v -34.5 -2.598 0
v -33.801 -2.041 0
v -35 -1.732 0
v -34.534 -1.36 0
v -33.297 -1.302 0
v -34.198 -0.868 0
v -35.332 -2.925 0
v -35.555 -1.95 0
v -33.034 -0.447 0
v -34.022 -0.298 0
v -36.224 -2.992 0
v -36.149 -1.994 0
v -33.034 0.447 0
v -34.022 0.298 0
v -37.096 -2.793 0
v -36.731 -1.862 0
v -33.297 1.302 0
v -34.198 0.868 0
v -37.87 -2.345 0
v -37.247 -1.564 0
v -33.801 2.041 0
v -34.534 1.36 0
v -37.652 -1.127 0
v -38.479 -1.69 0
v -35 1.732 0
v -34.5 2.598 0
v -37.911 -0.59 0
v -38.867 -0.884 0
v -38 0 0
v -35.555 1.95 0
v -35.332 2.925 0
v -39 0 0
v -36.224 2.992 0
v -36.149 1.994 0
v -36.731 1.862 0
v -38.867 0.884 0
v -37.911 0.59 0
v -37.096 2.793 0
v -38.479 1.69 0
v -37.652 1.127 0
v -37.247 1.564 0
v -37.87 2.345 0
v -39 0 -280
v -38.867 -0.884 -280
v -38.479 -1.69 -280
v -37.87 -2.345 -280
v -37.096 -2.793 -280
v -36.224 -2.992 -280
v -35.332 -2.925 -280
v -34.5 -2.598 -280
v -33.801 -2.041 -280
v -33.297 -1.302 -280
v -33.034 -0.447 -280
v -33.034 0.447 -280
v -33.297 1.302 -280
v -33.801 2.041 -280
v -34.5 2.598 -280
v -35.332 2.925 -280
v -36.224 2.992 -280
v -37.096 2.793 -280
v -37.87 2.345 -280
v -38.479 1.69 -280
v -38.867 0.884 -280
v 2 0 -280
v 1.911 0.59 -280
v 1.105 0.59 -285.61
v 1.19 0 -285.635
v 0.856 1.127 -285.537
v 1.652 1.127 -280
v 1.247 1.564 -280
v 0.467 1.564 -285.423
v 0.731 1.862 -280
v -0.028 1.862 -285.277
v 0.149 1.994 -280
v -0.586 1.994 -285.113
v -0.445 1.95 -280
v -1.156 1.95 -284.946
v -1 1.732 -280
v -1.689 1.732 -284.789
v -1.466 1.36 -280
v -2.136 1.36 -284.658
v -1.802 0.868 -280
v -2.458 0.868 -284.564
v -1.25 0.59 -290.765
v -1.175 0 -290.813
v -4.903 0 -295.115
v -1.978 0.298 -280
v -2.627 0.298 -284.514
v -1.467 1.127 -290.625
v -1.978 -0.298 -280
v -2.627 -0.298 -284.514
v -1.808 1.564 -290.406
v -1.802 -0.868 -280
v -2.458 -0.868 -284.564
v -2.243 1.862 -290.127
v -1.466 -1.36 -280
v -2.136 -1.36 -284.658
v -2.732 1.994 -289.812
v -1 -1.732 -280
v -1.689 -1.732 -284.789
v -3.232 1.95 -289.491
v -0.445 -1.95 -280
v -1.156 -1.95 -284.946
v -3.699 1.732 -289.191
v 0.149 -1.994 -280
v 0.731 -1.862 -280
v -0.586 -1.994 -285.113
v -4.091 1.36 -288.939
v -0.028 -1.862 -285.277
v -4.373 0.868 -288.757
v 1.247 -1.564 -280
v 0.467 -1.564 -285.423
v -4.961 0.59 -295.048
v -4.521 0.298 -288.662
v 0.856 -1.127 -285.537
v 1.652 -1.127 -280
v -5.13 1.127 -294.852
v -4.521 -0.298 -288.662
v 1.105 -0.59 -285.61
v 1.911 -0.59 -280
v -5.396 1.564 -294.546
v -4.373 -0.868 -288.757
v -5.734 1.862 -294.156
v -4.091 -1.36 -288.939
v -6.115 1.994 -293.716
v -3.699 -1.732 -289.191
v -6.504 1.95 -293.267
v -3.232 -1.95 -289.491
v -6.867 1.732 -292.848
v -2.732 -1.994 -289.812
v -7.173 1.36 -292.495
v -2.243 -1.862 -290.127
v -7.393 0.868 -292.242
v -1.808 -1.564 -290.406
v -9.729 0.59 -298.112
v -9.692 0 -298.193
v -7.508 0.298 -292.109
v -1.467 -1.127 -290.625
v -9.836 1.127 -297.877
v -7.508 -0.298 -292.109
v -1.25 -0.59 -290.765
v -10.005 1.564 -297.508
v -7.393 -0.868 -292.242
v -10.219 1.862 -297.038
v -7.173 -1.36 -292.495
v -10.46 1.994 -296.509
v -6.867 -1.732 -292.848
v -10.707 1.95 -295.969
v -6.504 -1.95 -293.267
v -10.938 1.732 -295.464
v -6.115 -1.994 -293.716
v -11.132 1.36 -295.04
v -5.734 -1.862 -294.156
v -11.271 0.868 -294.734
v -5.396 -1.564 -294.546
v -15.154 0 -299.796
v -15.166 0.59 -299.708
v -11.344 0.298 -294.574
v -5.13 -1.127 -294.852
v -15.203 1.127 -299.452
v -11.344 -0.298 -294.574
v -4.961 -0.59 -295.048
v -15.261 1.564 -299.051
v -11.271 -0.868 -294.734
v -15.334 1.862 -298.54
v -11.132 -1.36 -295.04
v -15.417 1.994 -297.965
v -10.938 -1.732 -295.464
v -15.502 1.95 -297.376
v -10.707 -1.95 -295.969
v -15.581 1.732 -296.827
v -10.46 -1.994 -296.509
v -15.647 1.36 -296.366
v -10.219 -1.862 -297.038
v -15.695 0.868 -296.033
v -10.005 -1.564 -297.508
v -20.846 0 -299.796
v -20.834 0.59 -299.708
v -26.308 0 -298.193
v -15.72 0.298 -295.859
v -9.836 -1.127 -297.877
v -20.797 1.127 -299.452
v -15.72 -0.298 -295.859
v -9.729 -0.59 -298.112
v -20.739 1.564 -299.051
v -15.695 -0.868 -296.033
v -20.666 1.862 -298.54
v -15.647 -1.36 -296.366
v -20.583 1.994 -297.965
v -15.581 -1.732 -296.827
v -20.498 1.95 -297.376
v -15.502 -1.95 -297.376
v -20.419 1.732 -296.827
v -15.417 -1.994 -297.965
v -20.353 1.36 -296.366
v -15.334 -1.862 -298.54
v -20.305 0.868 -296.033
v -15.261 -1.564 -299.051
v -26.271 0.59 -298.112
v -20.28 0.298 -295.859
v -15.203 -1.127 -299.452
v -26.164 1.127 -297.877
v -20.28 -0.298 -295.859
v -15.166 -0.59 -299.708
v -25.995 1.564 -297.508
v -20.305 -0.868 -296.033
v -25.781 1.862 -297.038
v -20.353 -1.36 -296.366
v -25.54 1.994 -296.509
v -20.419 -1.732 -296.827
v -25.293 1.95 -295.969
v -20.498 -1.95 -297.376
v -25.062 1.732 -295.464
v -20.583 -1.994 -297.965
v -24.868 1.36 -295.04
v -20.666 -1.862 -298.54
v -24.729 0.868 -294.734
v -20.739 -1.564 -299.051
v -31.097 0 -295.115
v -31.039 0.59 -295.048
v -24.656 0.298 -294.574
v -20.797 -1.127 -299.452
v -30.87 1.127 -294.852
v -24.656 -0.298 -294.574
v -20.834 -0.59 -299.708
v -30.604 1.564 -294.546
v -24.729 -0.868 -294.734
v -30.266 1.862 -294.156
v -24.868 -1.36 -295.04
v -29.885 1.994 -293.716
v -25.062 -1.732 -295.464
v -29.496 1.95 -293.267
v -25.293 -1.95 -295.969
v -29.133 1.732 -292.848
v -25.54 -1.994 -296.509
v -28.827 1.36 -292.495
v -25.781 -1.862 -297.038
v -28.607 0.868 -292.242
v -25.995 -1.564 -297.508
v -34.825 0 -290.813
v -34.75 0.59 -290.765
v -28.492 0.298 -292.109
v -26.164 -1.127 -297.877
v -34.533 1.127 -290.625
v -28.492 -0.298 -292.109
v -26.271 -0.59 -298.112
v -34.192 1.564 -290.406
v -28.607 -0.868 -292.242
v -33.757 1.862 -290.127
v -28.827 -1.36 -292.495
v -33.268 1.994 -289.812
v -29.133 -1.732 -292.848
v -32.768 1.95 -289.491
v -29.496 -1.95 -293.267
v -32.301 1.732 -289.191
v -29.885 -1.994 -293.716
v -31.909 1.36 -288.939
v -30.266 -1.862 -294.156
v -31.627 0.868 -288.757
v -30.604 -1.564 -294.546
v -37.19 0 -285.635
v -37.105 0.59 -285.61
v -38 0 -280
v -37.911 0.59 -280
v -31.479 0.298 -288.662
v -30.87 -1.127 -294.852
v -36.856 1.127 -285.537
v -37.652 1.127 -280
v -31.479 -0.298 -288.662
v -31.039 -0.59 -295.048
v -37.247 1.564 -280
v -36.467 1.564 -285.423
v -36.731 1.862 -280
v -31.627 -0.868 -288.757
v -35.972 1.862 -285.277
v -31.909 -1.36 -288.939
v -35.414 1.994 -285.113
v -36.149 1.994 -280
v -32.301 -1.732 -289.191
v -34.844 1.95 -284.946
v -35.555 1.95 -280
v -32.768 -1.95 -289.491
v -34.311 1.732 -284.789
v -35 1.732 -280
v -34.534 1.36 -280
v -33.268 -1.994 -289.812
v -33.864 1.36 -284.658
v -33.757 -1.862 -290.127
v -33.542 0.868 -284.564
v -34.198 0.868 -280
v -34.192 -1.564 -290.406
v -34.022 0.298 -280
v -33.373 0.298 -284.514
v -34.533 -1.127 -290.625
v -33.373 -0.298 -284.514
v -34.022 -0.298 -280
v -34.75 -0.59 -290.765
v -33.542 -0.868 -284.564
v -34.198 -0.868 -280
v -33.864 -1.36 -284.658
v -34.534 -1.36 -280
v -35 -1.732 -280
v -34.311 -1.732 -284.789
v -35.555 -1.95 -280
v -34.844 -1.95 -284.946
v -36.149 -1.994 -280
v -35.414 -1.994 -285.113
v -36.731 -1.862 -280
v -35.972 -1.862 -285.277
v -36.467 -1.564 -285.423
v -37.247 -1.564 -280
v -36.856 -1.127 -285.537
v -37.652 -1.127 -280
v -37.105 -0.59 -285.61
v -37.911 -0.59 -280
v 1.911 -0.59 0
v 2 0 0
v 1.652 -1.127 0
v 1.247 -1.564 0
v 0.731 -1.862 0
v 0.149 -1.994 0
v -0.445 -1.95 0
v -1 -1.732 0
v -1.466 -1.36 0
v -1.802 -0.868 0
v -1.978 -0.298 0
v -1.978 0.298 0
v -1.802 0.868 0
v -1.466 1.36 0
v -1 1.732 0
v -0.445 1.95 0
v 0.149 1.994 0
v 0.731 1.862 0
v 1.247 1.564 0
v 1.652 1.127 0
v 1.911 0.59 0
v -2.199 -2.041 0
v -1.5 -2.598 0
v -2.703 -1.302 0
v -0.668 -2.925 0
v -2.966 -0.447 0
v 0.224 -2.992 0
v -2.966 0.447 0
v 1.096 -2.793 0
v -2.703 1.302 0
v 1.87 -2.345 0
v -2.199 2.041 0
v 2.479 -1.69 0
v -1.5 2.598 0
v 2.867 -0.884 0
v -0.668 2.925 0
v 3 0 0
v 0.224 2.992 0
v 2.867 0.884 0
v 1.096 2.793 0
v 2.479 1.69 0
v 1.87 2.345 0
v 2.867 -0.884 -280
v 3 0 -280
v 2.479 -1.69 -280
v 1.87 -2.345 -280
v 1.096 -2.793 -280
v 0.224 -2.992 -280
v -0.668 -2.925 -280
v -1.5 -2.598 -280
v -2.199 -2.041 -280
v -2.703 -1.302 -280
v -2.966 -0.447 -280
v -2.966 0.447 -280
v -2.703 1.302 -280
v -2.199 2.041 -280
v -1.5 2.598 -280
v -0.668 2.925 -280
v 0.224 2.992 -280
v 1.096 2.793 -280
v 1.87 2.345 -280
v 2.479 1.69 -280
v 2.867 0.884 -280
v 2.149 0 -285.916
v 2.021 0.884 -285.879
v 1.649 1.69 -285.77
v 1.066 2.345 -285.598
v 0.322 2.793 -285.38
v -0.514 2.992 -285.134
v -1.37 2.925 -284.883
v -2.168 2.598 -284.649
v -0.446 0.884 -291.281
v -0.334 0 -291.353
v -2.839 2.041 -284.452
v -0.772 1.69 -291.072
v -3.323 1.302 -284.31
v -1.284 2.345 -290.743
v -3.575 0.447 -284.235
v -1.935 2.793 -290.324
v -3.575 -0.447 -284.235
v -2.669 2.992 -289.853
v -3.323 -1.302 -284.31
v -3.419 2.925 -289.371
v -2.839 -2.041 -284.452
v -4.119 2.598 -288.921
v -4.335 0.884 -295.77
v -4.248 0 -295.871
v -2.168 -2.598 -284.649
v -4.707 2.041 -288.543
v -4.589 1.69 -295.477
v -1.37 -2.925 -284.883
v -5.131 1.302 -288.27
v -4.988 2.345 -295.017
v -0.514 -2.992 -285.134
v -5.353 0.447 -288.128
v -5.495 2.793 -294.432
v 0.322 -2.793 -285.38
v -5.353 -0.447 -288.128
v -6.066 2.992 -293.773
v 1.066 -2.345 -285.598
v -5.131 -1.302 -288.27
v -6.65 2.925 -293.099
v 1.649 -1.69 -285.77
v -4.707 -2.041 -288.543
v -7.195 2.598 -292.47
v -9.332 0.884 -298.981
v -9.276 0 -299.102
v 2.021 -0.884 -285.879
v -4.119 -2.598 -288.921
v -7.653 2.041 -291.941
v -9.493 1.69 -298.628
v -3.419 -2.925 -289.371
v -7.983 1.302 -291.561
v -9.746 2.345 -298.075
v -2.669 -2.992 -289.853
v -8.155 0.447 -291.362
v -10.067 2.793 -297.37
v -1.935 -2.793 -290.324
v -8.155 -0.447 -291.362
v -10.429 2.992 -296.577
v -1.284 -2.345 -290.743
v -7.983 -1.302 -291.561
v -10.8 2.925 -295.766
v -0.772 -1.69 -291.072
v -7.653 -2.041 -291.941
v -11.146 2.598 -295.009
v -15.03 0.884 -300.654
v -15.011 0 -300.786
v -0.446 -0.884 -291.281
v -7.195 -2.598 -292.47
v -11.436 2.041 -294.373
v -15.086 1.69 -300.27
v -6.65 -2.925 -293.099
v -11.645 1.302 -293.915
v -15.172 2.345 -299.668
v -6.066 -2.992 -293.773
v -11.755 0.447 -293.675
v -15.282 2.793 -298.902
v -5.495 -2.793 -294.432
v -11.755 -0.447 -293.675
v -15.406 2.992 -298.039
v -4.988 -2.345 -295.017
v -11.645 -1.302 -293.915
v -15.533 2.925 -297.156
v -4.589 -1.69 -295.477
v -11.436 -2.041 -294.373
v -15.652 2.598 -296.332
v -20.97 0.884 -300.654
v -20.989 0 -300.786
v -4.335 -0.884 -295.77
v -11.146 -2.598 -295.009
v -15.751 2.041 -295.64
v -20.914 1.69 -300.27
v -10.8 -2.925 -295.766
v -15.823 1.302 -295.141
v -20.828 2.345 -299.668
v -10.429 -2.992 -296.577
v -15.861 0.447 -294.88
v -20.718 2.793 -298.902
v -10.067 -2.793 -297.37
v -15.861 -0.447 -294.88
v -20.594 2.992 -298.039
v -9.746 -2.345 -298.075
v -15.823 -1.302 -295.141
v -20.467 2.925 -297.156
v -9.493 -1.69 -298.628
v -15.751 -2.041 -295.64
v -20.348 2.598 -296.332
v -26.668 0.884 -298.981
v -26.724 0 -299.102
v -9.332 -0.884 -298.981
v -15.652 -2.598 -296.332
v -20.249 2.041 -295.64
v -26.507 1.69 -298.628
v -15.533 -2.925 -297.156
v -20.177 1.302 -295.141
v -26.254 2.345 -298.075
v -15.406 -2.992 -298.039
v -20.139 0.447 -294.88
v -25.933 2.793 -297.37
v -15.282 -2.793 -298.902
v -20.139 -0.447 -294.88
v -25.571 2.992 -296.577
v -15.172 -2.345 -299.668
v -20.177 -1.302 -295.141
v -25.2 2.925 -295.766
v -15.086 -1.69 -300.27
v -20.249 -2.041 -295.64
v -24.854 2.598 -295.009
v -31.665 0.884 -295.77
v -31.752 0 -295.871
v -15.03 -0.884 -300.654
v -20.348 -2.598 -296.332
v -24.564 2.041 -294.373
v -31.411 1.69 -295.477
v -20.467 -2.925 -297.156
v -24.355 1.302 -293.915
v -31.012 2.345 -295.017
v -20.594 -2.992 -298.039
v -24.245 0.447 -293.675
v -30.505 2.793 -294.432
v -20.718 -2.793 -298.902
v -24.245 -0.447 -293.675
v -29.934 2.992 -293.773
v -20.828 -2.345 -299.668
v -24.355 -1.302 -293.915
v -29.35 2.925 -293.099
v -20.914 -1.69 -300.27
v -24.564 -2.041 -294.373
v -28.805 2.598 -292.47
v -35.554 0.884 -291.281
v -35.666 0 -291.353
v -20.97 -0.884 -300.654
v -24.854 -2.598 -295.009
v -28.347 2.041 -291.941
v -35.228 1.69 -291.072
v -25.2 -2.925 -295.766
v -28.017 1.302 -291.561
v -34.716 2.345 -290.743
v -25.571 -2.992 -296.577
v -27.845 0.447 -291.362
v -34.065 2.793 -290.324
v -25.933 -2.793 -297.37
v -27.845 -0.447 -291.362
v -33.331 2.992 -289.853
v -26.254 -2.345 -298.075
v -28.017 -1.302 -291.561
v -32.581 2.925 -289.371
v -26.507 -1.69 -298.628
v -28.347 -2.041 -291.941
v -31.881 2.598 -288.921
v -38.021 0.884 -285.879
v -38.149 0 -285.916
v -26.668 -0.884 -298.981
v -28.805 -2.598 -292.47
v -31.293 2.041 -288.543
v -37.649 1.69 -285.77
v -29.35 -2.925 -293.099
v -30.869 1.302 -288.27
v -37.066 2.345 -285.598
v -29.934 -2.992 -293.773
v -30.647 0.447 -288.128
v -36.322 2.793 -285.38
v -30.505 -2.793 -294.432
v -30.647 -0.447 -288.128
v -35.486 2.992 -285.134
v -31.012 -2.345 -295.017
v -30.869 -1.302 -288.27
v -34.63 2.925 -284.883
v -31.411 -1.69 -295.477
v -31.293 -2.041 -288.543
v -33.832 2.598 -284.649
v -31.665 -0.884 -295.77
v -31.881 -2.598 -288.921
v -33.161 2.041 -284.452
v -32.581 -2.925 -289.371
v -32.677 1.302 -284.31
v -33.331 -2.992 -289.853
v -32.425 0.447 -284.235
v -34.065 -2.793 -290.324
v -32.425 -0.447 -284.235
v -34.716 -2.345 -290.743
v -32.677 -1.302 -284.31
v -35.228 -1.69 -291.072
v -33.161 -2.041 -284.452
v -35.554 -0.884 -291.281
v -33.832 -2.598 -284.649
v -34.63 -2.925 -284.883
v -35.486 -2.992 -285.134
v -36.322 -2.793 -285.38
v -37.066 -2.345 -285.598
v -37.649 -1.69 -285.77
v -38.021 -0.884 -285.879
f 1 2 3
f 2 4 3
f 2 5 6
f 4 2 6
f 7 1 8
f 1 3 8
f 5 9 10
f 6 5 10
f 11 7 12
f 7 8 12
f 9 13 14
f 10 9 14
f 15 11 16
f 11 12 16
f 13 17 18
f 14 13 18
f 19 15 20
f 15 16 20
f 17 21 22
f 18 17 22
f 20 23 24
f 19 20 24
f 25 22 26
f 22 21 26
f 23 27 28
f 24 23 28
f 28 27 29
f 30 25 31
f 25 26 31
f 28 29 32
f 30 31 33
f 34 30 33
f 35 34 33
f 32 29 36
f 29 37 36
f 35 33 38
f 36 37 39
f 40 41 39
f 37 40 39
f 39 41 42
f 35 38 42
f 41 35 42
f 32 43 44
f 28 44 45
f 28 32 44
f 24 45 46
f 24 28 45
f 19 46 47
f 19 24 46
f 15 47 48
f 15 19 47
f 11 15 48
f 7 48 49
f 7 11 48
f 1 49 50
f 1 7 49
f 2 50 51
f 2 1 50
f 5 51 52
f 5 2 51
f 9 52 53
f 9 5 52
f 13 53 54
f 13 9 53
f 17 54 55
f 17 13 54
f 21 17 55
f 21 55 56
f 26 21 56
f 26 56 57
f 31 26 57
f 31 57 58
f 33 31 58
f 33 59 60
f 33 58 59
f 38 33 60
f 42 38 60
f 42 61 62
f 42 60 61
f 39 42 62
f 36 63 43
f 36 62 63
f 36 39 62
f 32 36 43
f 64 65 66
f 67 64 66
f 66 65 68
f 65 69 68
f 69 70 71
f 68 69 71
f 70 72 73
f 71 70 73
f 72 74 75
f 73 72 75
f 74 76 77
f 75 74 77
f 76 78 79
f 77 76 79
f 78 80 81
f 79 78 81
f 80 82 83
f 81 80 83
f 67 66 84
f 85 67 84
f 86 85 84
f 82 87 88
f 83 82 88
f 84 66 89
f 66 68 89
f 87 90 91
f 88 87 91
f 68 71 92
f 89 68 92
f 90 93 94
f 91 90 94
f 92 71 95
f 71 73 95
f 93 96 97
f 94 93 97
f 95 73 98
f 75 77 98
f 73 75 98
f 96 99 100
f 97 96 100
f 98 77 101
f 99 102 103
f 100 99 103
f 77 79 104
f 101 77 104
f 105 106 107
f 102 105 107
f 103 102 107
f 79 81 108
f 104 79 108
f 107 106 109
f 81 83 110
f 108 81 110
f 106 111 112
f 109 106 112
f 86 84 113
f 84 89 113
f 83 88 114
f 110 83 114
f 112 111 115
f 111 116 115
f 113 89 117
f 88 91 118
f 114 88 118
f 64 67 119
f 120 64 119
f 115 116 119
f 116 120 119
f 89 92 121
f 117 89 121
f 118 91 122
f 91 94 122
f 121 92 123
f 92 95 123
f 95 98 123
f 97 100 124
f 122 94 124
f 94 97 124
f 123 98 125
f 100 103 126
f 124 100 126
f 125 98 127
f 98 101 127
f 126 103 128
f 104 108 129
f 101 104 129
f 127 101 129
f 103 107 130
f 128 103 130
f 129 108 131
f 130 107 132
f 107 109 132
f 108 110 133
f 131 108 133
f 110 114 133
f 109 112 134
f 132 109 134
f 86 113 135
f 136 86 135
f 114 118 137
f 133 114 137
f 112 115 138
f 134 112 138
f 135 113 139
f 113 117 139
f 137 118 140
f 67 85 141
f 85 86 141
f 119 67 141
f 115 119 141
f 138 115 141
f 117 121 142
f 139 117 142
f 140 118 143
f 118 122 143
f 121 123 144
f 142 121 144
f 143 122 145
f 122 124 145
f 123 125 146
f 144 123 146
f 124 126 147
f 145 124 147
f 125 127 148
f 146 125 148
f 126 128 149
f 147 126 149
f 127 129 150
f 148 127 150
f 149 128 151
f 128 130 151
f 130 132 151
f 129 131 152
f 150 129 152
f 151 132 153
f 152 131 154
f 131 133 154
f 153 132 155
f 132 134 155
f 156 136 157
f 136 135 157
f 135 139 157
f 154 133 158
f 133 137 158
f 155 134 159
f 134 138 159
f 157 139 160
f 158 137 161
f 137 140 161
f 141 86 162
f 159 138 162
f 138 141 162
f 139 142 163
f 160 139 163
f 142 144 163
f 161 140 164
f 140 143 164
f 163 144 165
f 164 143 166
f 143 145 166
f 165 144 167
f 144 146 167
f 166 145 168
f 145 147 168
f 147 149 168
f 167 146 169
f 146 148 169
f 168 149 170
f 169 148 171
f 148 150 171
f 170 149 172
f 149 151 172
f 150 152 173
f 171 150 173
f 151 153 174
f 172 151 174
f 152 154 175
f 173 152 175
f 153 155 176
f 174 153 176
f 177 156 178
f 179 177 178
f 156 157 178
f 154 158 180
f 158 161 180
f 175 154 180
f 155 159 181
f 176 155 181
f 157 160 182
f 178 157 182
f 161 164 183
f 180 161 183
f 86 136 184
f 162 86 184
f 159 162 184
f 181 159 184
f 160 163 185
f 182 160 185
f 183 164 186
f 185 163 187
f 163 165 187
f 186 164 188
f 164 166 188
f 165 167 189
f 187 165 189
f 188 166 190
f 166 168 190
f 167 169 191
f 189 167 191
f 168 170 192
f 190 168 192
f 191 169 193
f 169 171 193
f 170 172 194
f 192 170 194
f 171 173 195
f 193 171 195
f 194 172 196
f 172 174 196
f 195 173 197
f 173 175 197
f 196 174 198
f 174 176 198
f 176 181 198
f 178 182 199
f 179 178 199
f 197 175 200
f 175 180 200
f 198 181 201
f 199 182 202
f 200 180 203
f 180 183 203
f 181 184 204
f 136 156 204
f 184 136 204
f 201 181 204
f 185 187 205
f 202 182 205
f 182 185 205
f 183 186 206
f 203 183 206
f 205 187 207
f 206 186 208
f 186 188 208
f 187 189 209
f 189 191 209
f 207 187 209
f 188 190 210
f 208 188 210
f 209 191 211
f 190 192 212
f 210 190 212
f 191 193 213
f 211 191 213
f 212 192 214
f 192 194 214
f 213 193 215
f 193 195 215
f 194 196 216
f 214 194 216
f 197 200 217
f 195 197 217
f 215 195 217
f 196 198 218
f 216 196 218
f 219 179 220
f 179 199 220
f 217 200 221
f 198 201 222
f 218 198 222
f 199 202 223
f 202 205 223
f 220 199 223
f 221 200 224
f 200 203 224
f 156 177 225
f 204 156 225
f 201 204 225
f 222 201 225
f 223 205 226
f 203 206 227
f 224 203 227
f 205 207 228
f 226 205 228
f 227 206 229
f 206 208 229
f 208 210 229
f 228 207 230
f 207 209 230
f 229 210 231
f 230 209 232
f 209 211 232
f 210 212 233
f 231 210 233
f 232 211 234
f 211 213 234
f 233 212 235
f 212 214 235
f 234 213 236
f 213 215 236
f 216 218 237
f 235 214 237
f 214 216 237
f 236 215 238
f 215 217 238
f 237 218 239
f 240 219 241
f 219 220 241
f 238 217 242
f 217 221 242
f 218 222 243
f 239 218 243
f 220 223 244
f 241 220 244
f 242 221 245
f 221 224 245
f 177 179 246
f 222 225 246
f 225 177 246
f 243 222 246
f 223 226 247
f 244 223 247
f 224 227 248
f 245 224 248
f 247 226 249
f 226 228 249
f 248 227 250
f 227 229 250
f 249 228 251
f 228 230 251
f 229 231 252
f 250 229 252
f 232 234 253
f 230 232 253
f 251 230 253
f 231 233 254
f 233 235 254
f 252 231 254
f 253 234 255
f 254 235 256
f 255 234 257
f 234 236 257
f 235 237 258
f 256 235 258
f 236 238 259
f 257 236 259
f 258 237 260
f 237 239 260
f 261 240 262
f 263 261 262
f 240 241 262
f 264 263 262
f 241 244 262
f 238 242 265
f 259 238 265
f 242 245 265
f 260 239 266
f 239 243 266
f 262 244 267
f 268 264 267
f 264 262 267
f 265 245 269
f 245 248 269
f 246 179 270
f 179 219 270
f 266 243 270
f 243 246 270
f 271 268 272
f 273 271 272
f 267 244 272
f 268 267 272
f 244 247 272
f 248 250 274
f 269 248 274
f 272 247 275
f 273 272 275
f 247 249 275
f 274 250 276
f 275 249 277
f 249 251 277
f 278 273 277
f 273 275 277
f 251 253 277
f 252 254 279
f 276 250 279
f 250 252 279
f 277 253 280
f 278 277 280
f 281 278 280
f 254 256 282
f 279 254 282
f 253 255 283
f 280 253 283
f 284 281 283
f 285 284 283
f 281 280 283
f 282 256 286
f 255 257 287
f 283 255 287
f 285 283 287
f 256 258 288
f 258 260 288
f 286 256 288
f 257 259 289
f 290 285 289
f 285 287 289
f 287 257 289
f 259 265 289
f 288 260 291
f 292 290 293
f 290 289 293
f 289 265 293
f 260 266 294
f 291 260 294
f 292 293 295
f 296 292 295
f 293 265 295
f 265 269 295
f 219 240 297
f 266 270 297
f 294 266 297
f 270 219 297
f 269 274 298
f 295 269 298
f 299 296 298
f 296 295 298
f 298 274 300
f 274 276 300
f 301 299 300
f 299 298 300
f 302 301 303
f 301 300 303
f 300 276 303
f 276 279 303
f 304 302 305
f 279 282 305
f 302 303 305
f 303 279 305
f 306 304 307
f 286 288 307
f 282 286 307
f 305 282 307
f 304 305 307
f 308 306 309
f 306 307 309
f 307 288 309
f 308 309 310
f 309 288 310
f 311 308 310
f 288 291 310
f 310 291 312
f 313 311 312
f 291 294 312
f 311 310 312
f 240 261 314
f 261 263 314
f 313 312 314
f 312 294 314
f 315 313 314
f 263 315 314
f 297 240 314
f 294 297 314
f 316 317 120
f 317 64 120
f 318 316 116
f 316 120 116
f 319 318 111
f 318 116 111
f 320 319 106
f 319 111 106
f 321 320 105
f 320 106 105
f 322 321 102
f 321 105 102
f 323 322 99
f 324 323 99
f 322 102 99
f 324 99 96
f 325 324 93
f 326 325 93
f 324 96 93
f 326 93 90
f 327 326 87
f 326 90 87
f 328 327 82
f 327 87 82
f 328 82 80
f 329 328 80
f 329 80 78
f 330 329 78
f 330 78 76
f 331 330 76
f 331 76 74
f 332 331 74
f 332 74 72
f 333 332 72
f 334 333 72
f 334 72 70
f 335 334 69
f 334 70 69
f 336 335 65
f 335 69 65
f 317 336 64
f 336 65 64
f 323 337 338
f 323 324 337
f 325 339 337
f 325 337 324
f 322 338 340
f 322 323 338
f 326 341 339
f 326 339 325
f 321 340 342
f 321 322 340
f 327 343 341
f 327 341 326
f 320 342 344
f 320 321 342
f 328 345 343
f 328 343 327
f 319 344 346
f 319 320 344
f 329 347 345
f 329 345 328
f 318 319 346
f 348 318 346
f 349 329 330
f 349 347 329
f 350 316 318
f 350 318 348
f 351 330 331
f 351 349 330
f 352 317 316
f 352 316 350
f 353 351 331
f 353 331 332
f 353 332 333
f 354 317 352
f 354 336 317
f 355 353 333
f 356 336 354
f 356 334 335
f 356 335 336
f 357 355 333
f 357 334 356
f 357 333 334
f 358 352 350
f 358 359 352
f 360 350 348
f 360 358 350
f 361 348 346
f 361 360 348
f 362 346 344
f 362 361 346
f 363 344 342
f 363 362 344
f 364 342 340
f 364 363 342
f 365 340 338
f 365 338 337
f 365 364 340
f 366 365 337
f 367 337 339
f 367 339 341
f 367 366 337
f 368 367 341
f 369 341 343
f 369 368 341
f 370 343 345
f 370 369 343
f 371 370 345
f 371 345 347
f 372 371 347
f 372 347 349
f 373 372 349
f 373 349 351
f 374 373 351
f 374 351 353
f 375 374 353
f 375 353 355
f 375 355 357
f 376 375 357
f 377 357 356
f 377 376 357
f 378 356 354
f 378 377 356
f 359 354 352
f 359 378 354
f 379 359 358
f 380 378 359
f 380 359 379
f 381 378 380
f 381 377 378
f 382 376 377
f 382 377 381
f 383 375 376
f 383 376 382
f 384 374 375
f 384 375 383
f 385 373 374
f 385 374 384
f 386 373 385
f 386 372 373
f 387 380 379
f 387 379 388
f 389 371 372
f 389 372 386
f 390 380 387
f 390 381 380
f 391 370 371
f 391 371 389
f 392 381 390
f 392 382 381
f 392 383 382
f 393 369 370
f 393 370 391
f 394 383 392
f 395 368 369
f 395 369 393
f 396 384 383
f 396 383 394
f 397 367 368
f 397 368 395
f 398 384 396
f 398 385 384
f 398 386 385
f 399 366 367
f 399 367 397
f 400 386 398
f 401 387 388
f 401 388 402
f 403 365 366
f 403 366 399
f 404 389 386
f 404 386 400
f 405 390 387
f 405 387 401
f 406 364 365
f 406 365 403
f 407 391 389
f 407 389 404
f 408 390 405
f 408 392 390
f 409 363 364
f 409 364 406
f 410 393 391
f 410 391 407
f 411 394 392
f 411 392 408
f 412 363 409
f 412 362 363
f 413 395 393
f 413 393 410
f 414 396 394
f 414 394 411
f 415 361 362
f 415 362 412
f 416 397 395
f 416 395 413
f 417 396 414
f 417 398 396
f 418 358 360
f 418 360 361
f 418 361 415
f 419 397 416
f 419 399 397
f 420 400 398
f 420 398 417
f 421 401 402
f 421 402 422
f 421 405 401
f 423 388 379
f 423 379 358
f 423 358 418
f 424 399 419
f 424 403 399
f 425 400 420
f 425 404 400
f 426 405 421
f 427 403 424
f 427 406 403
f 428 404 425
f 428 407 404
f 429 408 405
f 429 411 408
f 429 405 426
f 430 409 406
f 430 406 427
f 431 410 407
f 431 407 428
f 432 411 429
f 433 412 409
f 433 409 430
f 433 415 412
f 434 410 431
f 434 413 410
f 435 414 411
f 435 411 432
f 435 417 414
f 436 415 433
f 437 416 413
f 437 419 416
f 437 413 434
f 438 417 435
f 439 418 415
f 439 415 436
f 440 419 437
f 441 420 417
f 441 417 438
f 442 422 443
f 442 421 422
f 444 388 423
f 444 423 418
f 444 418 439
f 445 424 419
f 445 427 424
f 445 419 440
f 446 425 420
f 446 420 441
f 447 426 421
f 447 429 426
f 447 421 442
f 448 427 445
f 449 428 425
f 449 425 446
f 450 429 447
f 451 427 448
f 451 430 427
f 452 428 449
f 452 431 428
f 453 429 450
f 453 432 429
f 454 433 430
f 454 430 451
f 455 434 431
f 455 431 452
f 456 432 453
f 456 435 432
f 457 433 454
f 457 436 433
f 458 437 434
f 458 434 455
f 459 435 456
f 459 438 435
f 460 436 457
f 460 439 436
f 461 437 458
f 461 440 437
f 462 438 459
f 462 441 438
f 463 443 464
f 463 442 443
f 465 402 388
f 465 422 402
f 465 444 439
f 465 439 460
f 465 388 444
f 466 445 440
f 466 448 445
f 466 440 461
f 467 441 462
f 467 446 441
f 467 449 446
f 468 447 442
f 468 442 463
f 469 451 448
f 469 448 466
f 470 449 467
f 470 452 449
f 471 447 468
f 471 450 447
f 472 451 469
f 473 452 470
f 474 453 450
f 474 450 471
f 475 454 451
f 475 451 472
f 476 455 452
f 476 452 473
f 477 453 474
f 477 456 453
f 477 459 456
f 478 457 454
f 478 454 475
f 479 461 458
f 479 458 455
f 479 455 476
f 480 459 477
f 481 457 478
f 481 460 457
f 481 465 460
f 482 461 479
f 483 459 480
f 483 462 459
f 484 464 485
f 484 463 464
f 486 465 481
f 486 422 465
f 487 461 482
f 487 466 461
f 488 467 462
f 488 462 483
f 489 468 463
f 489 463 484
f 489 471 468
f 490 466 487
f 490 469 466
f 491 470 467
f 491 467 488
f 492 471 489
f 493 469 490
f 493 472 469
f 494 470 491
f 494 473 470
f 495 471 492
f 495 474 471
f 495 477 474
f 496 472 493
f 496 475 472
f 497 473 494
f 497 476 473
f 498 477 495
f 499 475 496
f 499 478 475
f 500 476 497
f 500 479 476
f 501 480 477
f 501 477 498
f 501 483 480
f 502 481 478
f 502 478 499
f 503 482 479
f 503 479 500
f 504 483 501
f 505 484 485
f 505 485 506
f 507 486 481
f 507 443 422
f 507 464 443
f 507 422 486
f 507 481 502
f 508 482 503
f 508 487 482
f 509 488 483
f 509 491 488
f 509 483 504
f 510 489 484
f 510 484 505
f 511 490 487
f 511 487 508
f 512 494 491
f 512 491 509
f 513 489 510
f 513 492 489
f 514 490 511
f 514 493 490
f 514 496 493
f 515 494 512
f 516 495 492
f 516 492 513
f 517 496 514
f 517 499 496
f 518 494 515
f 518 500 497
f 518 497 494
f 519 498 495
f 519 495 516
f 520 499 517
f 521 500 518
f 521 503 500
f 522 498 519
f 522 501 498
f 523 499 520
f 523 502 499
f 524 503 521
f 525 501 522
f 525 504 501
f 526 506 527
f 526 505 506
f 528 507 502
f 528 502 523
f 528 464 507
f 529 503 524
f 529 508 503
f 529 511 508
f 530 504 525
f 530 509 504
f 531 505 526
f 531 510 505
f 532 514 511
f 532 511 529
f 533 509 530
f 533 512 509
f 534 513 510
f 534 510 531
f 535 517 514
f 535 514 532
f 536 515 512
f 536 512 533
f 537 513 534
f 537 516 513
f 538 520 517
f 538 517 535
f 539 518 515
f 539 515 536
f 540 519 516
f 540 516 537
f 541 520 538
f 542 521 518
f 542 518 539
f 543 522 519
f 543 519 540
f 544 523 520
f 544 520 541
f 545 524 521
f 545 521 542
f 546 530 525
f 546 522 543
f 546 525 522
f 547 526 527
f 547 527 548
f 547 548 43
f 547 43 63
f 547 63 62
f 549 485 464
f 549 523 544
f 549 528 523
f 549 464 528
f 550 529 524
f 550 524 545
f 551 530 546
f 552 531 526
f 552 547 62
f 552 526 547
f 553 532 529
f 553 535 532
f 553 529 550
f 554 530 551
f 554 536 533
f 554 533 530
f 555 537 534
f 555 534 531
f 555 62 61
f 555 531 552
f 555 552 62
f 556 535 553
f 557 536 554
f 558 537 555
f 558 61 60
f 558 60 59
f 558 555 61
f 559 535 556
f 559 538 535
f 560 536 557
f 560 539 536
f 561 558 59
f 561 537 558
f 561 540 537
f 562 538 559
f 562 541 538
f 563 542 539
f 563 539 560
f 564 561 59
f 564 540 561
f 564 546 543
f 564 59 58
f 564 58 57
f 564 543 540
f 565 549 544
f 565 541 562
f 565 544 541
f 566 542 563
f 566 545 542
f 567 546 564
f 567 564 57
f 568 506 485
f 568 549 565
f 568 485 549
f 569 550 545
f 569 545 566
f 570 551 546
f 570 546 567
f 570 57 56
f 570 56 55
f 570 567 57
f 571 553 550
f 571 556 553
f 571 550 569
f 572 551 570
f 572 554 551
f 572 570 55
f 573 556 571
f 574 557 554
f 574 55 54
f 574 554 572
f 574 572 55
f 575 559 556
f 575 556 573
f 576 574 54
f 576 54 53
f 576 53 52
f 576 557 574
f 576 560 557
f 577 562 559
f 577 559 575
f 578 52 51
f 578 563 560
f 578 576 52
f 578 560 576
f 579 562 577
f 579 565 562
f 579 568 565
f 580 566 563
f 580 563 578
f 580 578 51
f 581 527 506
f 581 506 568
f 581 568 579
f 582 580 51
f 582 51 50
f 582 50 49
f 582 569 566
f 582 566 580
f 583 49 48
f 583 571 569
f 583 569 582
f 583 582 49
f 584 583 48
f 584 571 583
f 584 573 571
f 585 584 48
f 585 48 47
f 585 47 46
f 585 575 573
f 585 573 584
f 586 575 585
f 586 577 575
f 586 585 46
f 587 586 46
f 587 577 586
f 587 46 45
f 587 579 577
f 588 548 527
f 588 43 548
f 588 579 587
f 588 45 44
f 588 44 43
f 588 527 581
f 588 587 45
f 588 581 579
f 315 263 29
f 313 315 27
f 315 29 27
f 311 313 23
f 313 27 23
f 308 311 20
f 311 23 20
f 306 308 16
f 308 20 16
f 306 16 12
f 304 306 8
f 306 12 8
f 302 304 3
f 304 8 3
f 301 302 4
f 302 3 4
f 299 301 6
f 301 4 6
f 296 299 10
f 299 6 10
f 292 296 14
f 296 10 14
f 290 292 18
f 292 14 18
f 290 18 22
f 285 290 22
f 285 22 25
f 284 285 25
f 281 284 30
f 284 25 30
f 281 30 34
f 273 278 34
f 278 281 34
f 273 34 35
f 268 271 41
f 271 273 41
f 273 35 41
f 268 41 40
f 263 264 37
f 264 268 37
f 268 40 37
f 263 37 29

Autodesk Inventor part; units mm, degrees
ref_plane "YZ Plane" through (0, 0, 0) normal (1, 0, 0) x (0, 1, 0)
ref_plane "XZ Plane" through (0, 0, 0) normal (0, 1, 0) x (-1, 0, 0)
ref_plane "XY Plane" through (0, 0, 0) normal (0, 0, 1) x (1, 0, 0)
sketch "Sketch1" plane through (0, 0, 0) normal (0, 0, 1) x (1, 0, 0)
  line L0 (0, 4.2) -> (0, -4.2) construction
  line L1 (-4.2, 0) -> (4.2, 0) construction
  circle A0 centre (0, 0) radius 3
  circle A1 centre (0, 0) radius 2
  dimension "d4" = 6
  dimension "d5" = 4
sketch "Sketch2" plane through (0, 0, 0) normal (0, 1, 0) x (-1, 0, 0)
  line L0 (0, 0) -> (0, -280)
  arc A0 (0, -280) -> (36, -280) centre (18, -280) ccw
  line L1 (36, -280) -> (36, 0)
  dimension "d6" = 36
  dimension "d7" = 280
  dimension "d13" = 280
sweep "Sweep1" add profiles "Sketch1" path "Sketch2"
equation "\"d7\" = d13"
properties part number "17-0028-0022" material "Copper"
